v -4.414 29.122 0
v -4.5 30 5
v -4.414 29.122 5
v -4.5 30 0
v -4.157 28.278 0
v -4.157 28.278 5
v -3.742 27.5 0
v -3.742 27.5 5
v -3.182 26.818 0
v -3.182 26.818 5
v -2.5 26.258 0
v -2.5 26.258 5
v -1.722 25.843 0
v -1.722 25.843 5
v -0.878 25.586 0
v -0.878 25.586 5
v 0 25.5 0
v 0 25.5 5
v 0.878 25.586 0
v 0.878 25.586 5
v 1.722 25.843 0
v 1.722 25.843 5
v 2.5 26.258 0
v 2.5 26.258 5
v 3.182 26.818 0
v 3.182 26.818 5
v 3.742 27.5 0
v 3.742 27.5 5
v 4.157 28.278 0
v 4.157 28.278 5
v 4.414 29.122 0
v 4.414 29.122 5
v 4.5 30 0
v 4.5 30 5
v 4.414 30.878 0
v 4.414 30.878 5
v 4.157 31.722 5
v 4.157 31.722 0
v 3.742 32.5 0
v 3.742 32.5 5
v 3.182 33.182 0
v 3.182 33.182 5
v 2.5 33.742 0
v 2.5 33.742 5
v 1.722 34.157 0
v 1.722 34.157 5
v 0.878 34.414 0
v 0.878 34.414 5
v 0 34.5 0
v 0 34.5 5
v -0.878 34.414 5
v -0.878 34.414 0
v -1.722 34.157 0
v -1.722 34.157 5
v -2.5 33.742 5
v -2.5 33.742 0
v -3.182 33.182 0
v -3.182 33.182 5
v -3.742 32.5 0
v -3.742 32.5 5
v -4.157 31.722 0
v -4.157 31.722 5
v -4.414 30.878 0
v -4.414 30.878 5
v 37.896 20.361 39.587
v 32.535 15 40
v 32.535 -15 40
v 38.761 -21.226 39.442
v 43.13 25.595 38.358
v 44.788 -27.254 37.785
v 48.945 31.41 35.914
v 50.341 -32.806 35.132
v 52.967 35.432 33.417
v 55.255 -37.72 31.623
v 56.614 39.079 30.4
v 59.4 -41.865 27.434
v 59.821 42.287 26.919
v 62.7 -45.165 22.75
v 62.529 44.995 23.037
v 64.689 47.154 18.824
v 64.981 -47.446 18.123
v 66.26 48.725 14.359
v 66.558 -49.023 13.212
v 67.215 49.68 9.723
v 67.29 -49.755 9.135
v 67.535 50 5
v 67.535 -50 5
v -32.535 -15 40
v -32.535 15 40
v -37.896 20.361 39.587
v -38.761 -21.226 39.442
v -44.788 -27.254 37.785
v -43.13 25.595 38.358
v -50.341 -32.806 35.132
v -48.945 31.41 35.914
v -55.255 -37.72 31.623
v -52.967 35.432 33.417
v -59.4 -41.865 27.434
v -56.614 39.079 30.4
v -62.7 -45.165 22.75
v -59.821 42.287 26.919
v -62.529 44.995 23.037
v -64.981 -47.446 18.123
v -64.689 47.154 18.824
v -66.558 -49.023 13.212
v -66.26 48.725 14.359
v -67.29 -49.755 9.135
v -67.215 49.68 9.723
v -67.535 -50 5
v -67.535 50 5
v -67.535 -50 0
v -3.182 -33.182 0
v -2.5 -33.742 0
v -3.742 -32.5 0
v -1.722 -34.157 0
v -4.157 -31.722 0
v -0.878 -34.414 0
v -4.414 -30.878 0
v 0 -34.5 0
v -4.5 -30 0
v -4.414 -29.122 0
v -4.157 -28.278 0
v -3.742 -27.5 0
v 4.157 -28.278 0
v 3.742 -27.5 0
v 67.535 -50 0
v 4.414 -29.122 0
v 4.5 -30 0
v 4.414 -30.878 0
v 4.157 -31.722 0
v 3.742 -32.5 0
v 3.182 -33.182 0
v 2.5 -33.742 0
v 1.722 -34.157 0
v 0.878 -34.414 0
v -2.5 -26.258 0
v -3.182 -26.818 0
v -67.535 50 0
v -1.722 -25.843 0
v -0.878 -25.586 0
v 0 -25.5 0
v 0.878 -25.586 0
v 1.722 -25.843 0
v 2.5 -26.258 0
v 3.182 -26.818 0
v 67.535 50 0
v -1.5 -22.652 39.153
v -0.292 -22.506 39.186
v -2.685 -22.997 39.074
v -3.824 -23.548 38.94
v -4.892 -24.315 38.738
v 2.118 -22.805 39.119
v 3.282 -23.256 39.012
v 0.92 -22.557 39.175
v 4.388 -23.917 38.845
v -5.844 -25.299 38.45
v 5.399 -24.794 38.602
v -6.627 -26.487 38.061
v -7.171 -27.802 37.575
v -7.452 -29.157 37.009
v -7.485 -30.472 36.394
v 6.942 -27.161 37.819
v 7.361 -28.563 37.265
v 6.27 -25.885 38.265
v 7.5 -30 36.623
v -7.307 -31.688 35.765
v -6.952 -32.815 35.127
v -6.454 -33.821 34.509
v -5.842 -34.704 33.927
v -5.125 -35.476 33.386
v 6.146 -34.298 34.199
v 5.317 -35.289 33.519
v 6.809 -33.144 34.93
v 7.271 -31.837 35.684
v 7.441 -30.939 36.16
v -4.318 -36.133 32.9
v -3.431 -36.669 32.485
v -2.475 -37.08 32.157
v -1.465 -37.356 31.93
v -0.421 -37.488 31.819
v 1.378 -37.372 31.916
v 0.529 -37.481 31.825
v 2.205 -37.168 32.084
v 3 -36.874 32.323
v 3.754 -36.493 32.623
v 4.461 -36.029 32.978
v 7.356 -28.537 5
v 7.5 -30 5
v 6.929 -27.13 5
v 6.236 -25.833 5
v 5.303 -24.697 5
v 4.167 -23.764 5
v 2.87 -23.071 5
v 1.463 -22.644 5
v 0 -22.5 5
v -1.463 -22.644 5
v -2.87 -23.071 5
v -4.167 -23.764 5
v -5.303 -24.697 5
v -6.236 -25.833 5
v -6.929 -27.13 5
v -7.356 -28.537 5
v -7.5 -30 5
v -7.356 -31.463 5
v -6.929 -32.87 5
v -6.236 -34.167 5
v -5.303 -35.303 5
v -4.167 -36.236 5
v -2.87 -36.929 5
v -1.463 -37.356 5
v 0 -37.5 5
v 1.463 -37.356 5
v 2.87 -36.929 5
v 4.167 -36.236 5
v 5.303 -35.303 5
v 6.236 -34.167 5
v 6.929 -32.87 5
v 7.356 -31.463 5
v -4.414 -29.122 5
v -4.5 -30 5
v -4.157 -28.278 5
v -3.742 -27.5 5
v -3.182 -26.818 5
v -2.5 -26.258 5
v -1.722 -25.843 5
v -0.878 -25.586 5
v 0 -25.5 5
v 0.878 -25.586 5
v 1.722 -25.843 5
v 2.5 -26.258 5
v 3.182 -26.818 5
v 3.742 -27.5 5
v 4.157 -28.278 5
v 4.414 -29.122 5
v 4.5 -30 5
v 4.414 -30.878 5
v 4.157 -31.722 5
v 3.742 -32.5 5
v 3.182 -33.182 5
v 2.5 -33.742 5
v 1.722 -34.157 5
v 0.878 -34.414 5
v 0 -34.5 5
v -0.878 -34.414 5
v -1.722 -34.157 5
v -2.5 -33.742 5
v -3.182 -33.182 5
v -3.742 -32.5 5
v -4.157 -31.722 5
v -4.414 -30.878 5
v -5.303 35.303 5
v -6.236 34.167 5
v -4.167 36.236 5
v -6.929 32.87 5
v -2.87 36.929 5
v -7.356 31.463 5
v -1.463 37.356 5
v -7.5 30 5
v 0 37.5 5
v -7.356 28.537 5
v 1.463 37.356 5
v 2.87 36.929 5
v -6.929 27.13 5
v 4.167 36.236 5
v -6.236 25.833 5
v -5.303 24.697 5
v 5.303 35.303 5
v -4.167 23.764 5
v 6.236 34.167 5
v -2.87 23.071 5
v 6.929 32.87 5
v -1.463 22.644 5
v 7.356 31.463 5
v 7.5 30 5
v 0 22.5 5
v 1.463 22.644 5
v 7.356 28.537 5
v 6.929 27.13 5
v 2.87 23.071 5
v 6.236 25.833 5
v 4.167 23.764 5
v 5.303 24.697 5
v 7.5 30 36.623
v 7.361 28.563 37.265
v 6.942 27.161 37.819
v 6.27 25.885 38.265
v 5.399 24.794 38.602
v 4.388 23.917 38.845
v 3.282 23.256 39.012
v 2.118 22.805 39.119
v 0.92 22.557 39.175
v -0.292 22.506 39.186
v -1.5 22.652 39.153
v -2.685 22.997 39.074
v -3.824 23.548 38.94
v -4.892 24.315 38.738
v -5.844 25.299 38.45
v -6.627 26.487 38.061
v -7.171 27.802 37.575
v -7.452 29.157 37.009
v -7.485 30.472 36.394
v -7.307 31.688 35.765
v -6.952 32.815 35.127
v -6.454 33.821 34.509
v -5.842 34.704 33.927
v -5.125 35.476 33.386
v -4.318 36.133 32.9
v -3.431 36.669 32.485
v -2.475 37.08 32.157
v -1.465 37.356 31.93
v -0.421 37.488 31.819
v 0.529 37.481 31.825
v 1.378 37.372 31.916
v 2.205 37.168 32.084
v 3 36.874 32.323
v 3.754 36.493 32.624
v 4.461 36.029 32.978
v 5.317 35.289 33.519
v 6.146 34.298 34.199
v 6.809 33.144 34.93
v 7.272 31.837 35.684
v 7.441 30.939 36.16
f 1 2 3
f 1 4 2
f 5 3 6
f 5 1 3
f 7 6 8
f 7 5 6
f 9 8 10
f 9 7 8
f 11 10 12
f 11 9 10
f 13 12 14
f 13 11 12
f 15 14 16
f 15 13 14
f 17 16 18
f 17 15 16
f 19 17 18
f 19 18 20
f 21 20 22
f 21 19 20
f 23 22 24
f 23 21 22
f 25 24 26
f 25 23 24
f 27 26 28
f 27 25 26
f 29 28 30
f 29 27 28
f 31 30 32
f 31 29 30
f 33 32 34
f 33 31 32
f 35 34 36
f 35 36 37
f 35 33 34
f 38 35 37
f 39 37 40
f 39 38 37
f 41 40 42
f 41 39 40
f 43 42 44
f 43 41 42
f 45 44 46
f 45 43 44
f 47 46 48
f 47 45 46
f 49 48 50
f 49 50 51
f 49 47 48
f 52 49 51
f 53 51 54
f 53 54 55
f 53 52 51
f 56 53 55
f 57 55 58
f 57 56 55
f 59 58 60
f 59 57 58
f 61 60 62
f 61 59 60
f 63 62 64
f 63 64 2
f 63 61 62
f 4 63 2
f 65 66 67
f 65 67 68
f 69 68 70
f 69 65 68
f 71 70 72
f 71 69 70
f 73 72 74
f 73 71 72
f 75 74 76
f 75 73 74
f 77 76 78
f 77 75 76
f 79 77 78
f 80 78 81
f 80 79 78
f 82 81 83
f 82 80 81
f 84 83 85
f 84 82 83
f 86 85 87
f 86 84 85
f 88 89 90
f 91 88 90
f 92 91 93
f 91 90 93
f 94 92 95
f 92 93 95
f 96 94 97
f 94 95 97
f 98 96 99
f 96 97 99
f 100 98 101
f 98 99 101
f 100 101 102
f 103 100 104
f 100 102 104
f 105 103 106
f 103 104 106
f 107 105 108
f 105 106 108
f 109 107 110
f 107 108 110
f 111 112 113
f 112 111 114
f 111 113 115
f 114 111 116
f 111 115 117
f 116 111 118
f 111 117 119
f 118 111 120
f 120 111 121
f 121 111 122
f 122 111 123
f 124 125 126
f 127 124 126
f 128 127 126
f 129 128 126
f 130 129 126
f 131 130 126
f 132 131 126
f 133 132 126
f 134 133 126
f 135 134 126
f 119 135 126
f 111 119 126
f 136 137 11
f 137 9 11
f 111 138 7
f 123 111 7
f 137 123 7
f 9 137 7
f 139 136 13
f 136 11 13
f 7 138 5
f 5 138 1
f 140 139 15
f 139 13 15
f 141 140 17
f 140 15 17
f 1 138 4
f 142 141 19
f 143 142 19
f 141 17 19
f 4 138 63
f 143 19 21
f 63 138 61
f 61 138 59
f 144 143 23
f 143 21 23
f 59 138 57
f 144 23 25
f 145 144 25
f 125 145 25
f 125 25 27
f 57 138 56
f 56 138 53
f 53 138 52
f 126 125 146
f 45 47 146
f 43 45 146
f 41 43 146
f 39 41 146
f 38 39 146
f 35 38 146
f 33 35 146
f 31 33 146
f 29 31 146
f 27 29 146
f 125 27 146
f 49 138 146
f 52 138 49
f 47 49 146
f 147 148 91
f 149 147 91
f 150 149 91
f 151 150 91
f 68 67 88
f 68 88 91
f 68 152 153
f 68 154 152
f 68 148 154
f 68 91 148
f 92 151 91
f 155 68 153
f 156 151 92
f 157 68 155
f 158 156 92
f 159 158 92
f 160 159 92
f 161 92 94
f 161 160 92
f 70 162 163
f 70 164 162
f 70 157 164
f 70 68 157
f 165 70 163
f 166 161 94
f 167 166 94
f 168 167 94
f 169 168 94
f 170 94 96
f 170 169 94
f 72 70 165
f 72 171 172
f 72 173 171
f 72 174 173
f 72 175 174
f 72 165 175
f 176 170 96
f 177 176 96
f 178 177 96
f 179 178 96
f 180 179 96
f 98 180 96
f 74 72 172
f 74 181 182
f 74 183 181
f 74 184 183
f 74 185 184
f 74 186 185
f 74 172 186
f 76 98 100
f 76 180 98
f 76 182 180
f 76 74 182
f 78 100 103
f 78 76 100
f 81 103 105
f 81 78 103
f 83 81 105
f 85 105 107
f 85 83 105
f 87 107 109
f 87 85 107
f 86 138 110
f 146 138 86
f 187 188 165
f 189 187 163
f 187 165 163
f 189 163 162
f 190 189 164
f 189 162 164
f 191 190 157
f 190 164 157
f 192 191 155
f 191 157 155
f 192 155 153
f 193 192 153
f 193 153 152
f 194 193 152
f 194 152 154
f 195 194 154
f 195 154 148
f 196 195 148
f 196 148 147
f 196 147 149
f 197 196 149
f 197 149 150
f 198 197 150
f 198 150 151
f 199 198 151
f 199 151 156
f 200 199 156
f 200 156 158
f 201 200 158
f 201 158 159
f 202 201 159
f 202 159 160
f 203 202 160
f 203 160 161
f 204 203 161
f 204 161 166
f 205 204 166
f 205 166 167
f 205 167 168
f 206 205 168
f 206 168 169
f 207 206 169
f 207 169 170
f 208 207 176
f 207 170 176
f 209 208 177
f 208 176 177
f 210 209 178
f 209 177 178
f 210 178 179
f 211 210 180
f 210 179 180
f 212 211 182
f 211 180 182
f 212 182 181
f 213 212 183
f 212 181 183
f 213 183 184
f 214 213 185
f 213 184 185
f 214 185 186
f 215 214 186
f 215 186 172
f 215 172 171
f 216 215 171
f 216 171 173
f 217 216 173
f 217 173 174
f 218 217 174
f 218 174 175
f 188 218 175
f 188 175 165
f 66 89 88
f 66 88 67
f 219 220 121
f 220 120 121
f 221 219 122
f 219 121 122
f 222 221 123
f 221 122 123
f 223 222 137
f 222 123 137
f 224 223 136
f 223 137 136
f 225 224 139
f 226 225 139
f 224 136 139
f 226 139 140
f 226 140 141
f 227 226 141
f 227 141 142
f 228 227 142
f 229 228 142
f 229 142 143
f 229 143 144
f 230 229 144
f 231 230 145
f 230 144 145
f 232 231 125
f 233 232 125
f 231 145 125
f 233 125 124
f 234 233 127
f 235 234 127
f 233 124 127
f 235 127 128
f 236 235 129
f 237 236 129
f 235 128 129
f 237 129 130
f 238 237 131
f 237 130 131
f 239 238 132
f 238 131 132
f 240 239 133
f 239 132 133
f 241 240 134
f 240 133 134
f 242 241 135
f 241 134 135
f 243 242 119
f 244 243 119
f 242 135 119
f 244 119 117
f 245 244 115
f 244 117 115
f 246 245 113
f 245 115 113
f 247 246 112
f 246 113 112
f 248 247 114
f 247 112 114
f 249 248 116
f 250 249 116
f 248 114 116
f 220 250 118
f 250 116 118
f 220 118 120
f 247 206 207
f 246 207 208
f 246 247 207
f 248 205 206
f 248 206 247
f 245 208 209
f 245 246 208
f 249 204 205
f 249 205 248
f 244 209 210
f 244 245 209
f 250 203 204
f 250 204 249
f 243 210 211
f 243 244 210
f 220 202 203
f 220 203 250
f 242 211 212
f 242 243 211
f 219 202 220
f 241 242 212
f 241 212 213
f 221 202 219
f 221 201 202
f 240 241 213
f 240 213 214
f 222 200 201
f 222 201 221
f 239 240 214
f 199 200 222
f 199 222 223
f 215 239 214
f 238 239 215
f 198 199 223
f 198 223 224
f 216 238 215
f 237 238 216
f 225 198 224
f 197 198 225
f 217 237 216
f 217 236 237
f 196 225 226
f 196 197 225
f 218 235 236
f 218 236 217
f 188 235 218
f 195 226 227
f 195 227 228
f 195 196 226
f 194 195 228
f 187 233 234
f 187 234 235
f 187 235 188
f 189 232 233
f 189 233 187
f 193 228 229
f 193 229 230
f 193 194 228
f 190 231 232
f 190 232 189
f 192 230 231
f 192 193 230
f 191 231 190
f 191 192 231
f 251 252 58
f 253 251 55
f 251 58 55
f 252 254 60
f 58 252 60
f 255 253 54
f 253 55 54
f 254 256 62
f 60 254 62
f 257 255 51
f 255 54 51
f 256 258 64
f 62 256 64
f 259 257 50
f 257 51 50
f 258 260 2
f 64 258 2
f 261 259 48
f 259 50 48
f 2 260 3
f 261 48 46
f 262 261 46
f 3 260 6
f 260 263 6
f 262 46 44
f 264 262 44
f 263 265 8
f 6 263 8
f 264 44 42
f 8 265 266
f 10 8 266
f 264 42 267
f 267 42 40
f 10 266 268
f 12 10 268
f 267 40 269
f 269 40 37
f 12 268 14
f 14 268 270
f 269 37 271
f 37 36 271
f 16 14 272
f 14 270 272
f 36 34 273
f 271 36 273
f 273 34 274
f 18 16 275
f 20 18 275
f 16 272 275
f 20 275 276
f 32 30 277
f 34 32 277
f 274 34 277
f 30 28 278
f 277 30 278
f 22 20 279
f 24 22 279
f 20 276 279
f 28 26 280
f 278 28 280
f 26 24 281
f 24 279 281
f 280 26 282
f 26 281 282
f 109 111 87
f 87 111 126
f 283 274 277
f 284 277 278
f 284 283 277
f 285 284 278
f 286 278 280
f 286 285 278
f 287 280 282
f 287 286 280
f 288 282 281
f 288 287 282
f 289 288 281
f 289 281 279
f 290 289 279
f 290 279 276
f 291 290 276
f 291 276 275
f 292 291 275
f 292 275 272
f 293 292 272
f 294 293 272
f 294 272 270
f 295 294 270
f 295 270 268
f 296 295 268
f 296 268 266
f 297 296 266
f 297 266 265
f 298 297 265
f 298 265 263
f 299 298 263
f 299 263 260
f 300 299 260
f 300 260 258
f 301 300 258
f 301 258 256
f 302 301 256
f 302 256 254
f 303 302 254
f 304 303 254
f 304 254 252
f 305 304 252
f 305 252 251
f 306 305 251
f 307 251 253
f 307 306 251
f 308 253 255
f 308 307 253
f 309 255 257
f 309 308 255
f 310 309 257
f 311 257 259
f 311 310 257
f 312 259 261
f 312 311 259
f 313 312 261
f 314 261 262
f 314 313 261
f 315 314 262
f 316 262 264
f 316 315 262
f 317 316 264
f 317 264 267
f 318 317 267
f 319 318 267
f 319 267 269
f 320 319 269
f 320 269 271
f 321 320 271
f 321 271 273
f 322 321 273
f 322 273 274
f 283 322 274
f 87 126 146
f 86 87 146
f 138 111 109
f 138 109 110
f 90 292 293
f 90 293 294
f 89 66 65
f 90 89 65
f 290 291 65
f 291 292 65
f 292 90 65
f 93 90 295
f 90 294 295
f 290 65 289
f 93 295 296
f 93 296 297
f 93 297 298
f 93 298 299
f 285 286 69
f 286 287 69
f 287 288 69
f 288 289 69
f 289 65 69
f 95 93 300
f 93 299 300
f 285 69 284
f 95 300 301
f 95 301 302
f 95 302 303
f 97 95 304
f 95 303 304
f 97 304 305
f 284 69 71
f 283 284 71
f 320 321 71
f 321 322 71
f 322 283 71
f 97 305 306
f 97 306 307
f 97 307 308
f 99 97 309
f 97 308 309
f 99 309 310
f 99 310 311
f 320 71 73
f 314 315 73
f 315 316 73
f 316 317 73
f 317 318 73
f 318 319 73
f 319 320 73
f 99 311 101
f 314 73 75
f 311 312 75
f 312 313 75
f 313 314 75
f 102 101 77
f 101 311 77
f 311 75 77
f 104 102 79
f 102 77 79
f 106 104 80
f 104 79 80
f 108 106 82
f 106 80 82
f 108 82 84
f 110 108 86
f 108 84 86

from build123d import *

# Parameters (mm, degrees)
SKIZZE1_W                                           = 135.069444444
SKIZZE1_H                                           = 100
AUFSATZ_LINEAR_AUSTRAGEN1_DEPTH                     = 40
SCHNITT_LINEAR_AUSTRAGEN1_DEPTH                     = 150.47827542
SCHNITT_LINEAR_AUSTRAGEN2_DEPTH                     = 128.125680748
STIRNSENKUNG_F_R_M8_SENKSCHRAUBE_KOPF_B_D           = 9
STIRNSENKUNG_F_R_M8_SENKSCHRAUBE_KOPF_B_CBORE_D     = 15
STIRNSENKUNG_F_R_M8_SENKSCHRAUBE_KOPF_B_CBORE_DEPTH = 35


with BuildPart() as part:
    # Skizze1 → Aufsatz-Linear austragen1 (new body)
    with BuildSketch(Plane.XY):
        Rectangle(SKIZZE1_W, SKIZZE1_H)
    extrude(amount=AUFSATZ_LINEAR_AUSTRAGEN1_DEPTH)

    # Skizze2 → Schnitt-Linear austragen1 (cut, through all)
    with BuildSketch(Plane(origin=(67.534722222, 0, 0), x_dir=(0, 0, -1), z_dir=(1, 0, 0))):
        with BuildLine():
            Line((-5, 50), (42.421873459, 50))
            Line((42.421873459, 50), (-56.728012939, 80.829845409))
            Line((-56.728012939, 80.829845409), (-40, -11.655385644))
            Line((-40, -11.655385644), (-40, 15))
            ThreePointArc((-40, 15), (-29.748737342, 39.748737342), (-5, 50))
        make_face()
    schnitt_linear_austragen1 = extrude(amount=-SCHNITT_LINEAR_AUSTRAGEN1_DEPTH, mode=Mode.SUBTRACT)

    # Spiegeln1: Schnitt-Linear austragen1 across plane
    add(schnitt_linear_austragen1.mirror(Plane.ZX), mode=Mode.SUBTRACT)

    # Skizze5 → Schnitt-Linear austragen2 (cut, through all)
    with BuildSketch(Plane(origin=(0, 50, 0), x_dir=(1, 0, 0), z_dir=(0, 1, 0))):
        with BuildLine():
            Line((-67.534722222, -5), (-67.534722222, -19.872389704))
            Line((-67.534722222, -19.872389704), (-98.364567631, -61.728012939))
            Line((-98.364567631, -61.728012939), (-5.879336578, -40))
            Line((-5.879336578, -40), (-32.534722222, -40))
            ThreePointArc((-32.534722222, -40), (-57.283459564, -29.748737342), (-67.534722222, -5))
        make_face()
    schnitt_linear_austragen2 = extrude(amount=-SCHNITT_LINEAR_AUSTRAGEN2_DEPTH, mode=Mode.SUBTRACT)

    # Spiegeln2: Schnitt-Linear austragen2 across plane
    add(schnitt_linear_austragen2.mirror(Plane(origin=(0, 0, 0), x_dir=(0, 0, 1), z_dir=(1, 0, 0))), mode=Mode.SUBTRACT)

    # Stirnsenkung für M8 Senkschraube (Kopf Button)3 (through all)
    with Locations(Plane.XY.offset(40)):
        with Locations((0, -30)):
            stirnsenkung_f_r_m8_senkschraube_kopf_b = CounterBoreHole(STIRNSENKUNG_F_R_M8_SENKSCHRAUBE_KOPF_B_D / 2, STIRNSENKUNG_F_R_M8_SENKSCHRAUBE_KOPF_B_CBORE_D / 2, STIRNSENKUNG_F_R_M8_SENKSCHRAUBE_KOPF_B_CBORE_DEPTH)

    # Spiegeln5: Stirnsenkung für M8 Senkschraube (Kopf Button)3 across plane
    add(stirnsenkung_f_r_m8_senkschraube_kopf_b.mirror(Plane.ZX), mode=Mode.SUBTRACT)


solid = part.part
